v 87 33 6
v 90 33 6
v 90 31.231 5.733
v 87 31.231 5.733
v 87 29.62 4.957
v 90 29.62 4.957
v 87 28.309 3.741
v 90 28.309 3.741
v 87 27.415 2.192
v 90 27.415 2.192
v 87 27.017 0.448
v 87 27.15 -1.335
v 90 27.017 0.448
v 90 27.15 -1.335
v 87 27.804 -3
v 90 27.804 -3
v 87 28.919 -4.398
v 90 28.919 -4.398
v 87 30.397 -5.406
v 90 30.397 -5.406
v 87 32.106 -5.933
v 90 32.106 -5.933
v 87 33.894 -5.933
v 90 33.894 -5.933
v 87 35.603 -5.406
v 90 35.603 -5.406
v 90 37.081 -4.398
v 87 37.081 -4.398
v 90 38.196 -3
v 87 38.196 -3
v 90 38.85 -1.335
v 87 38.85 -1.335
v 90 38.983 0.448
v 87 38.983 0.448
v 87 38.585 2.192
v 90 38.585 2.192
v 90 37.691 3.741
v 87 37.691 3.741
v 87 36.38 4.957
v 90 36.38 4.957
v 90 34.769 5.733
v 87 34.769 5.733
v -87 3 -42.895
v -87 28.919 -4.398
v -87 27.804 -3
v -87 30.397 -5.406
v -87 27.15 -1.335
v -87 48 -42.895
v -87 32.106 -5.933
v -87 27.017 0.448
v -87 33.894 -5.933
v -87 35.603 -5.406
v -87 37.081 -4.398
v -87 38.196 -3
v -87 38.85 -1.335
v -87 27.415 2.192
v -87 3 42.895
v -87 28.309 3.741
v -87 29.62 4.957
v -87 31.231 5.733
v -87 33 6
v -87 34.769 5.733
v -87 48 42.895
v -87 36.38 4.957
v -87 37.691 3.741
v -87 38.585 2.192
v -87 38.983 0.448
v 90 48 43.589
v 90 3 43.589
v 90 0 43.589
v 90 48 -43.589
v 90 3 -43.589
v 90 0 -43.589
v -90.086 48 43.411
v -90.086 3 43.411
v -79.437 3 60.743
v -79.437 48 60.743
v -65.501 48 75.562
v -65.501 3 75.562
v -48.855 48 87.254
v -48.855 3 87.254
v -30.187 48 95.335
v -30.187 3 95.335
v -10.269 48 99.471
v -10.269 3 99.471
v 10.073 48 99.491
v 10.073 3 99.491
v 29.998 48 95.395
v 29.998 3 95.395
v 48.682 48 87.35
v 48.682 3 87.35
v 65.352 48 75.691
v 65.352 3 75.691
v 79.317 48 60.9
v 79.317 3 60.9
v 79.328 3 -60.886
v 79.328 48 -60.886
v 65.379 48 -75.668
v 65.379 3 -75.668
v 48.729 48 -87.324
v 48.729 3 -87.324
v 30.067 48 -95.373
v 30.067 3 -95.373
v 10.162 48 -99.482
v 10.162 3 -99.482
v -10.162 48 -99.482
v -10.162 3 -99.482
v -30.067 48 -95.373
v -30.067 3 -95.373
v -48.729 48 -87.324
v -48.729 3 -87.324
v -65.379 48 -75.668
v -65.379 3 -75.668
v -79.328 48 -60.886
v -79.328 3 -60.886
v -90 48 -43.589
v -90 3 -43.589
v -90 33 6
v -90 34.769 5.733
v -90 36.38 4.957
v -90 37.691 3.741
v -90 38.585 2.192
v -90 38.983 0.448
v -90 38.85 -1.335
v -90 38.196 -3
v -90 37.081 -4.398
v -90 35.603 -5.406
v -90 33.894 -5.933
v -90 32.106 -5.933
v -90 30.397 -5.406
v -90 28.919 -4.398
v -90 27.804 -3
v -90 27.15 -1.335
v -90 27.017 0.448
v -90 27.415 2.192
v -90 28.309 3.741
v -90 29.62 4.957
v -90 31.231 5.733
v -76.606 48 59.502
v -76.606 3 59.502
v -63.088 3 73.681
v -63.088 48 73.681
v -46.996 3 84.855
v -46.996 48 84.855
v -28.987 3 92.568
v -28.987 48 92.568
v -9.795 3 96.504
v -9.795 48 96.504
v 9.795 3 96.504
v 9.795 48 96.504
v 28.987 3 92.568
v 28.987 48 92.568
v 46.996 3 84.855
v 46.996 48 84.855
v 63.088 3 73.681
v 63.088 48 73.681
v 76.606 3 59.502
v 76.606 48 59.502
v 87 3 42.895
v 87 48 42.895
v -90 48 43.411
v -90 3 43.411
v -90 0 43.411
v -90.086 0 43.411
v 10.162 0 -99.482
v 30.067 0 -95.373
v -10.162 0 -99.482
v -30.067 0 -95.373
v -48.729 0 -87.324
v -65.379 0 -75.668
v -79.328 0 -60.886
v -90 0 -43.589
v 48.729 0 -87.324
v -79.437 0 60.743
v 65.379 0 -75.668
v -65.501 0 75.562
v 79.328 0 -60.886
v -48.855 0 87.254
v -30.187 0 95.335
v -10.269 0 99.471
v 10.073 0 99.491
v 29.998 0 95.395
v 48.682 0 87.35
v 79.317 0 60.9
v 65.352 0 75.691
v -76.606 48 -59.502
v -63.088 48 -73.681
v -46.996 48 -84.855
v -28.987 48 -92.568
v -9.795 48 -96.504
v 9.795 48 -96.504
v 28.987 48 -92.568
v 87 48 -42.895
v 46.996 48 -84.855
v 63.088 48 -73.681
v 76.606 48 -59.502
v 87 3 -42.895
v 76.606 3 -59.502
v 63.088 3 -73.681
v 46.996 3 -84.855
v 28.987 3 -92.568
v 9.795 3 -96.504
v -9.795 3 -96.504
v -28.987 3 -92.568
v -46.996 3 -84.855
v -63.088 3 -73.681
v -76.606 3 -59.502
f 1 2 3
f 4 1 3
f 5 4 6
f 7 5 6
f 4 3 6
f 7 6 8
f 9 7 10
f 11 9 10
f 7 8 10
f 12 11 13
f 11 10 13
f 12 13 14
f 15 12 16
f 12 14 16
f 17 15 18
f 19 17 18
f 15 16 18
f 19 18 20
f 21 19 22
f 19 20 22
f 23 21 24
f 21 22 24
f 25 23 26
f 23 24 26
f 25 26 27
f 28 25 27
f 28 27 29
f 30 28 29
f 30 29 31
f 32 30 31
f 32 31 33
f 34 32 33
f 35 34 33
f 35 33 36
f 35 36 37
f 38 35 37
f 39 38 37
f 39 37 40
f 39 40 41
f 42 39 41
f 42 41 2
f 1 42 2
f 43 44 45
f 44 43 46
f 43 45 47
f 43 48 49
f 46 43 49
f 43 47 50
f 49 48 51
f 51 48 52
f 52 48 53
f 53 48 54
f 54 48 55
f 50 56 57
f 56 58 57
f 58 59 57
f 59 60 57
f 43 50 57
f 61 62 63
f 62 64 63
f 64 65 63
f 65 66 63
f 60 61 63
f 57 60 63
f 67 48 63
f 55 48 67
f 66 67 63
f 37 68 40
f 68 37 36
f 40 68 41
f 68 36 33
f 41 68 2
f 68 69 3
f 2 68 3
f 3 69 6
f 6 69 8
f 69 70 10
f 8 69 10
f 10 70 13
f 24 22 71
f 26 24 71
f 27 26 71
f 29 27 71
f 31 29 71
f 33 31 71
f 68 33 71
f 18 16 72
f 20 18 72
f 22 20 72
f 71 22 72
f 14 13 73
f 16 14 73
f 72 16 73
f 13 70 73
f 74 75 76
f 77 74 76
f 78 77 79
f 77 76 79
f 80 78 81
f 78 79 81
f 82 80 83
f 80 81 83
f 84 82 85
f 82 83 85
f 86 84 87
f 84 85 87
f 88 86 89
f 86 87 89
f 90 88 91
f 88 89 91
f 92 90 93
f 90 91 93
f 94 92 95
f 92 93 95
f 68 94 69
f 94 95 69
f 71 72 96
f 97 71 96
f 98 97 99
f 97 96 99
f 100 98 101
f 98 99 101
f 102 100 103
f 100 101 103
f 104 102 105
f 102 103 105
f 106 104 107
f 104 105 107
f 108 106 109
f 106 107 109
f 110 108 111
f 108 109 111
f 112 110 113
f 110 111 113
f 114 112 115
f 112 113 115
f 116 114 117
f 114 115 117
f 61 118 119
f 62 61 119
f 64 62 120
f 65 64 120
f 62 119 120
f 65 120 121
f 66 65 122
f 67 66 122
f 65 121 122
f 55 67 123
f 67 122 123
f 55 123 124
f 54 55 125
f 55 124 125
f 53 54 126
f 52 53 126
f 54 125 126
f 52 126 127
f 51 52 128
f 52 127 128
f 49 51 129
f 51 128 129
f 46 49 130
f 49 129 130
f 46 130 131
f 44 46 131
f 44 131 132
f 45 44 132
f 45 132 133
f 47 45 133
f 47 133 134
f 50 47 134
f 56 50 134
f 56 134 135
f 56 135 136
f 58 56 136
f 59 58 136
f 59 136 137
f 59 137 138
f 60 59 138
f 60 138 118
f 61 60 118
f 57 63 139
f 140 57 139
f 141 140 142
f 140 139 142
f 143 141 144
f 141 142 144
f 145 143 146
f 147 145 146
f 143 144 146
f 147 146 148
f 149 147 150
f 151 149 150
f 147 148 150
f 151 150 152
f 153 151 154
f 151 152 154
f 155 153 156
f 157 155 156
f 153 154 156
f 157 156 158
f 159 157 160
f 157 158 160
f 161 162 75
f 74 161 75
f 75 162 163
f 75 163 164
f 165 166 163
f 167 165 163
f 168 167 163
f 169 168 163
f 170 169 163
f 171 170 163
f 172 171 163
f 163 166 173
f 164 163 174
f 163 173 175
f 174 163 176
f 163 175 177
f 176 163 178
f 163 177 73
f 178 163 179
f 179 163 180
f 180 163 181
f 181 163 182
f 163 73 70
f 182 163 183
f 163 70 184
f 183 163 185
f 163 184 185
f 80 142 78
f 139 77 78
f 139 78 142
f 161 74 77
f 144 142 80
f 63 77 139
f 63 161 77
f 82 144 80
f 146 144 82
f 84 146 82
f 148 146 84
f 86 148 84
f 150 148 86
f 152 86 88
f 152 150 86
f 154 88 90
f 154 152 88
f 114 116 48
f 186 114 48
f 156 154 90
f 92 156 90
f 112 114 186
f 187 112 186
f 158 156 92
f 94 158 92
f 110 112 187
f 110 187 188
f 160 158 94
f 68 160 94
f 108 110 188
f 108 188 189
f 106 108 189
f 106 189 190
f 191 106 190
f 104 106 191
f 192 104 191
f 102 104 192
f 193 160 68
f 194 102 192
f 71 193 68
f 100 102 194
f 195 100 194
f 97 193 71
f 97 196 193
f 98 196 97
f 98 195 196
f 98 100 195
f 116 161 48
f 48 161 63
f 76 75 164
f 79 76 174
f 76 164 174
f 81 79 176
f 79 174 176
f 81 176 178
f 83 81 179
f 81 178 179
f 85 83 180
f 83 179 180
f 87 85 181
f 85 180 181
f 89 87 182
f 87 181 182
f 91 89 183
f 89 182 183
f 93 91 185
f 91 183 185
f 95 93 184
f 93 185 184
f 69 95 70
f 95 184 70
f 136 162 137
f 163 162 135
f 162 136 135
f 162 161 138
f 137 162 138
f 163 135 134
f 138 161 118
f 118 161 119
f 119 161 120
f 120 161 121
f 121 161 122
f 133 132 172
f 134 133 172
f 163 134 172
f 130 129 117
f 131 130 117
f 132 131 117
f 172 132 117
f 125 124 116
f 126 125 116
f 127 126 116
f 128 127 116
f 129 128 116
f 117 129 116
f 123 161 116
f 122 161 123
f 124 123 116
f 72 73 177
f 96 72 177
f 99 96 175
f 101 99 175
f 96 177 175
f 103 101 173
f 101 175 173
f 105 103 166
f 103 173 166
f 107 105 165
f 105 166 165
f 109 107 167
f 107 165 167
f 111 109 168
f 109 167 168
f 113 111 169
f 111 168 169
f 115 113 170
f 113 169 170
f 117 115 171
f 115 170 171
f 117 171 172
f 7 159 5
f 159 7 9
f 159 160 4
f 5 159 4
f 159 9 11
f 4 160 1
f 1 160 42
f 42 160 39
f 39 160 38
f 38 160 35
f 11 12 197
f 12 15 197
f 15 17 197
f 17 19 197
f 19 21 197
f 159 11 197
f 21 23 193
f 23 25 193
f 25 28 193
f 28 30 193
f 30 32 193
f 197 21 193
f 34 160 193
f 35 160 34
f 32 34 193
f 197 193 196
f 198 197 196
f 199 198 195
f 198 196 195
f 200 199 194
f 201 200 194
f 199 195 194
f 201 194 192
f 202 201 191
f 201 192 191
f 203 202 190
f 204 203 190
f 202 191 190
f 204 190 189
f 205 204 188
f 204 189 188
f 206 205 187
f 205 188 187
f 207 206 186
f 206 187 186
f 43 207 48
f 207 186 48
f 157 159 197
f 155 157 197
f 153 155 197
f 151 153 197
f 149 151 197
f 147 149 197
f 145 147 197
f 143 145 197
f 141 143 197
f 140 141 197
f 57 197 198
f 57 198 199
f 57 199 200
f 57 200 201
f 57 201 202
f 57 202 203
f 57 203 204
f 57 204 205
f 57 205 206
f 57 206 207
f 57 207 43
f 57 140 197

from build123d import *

# Parameters (mm, degrees)
SKETCH1_R           = 100
BOSS_EXTRUDE2_DEPTH = 3
SKETCH5_W           = 3
SKETCH5_H           = 87
BOSS_EXTRUDE5_DEPTH = 45
SKETCH8_W           = 3
SKETCH8_H           = 87
BOSS_EXTRUDE6_DEPTH = 45
SKETCH9_W           = 23.719660605
SKETCH9_H           = 94.301811056
CUT_EXTRUDE2_DEPTH  = 45
SKETCH10_W          = 23.969699351
SKETCH10_H          = 92.447375273
CUT_EXTRUDE3_DEPTH  = 45
SKETCH11_R          = 6
CUT_EXTRUDE4_DEPTH  = 45
SKETCH12_R          = 6
CUT_EXTRUDE5_DEPTH  = 45
BOSS_EXTRUDE7_DEPTH = 45
CUT_EXTRUDE6_DEPTH  = 45


with BuildPart() as part:
    # Sketch1 → Boss-Extrude2 (new body)
    with BuildSketch(Plane(origin=(0, 0, 0), x_dir=(1, 0, 0), z_dir=(0, 1, 0))):
        with Locations(Location((0, 0, 0), (0, 0, 270))):
            Circle(SKETCH1_R)
    extrude(amount=BOSS_EXTRUDE2_DEPTH)

    # Sketch5 → Boss-Extrude5 (add)
    with BuildSketch(Plane(origin=(0, 3, 0), x_dir=(1, 0, 0), z_dir=(0, 1, 0))):
        with Locations((88.5, 0.088989435)):
            Rectangle(SKETCH5_W, SKETCH5_H)
    extrude(amount=BOSS_EXTRUDE5_DEPTH)

    # Sketch8 → Boss-Extrude6 (add)
    with BuildSketch(Plane(origin=(0, 3, 0), x_dir=(1, 0, 0), z_dir=(0, 1, 0))):
        with Locations((-88.5, 0.088989435)):
            Rectangle(SKETCH8_W, SKETCH8_H)
    extrude(amount=BOSS_EXTRUDE6_DEPTH)

    # Sketch9 → Cut-Extrude2 (cut)
    with BuildSketch(Plane(origin=(0, 3, 0), x_dir=(1, 0, 0), z_dir=(0, 1, 0))):
        with Locations((101.859830303, -3.561916093)):
            Rectangle(SKETCH9_W, SKETCH9_H)
    extrude(amount=-CUT_EXTRUDE2_DEPTH, mode=Mode.SUBTRACT)

    # Sketch10 → Cut-Extrude3 (cut)
    with BuildSketch(Plane(origin=(0, 3, 0), x_dir=(1, 0, 0), z_dir=(0, 1, 0))):
        with Locations((-101.984849676, 2.812677071)):
            Rectangle(SKETCH10_W, SKETCH10_H)
    extrude(amount=-CUT_EXTRUDE3_DEPTH, mode=Mode.SUBTRACT)

    # Sketch11 → Cut-Extrude4 (cut)
    with BuildSketch(Plane.ZY.offset(90)):
        with Locations((0, 33)):
            Circle(SKETCH11_R)
    extrude(amount=-CUT_EXTRUDE4_DEPTH, mode=Mode.SUBTRACT)

    # Sketch12 → Cut-Extrude5 (cut)
    with BuildSketch(Plane(origin=(90, 0, 0), x_dir=(0, 0, -1), z_dir=(1, 0, 0))):
        with Locations(Location((0, 33, 0), (0, 0, 180))):
            Circle(SKETCH12_R)
    extrude(amount=-CUT_EXTRUDE5_DEPTH, mode=Mode.SUBTRACT)

    # Sketch14 → Boss-Extrude7 (add)
    with BuildSketch(Plane(origin=(0, 3, 0), x_dir=(1, 0, 0), z_dir=(0, 1, 0))):
        with BuildLine():
            Line((-90, -43.411010565), (-90.085982049, -43.411010565))
            ThreePointArc((-90.085982049, -43.411010565), (-0.098829893, -99.999951163), (90, -43.588989435))
            Line((90, -43.588989435), (90, -43.411010565))
            Line((90, -43.411010565), (87, -43.411010565))
            Line((87, -43.411010565), (87, 43.588989435))
            Line((87, 43.588989435), (90, 43.588989435))
            ThreePointArc((90, 43.588989435), (0, 100), (-90, 43.588989435))
            Line((-90, 43.588989435), (-87, 43.588989435))
            Line((-87, 43.588989435), (-87, -43.411010565))
            Line((-87, -43.411010565), (-90, -43.411010565))
        make_face()
    extrude(amount=BOSS_EXTRUDE7_DEPTH)

    # 3DSketch1 → Cut-Extrude6 (cut)
    with BuildSketch(Plane(origin=(-87, 48, -42.895221179), x_dir=(0.8969072164948455, 0, 0.4422187750417981), z_dir=(0, -1, 0))):
        with BuildLine():
            Line((0, 0), (37.93814433, 76.946066857))
            ThreePointArc((37.93814433, 76.946066857), (139.895221179, 87), (194, 0))
            Line((194, 0), (156.06185567, -76.946066857))
            ThreePointArc((156.06185567, -76.946066857), (54.104778821, -87), (0, 0))
        make_face()
    extrude(amount=CUT_EXTRUDE6_DEPTH, mode=Mode.SUBTRACT)


solid = part.part
